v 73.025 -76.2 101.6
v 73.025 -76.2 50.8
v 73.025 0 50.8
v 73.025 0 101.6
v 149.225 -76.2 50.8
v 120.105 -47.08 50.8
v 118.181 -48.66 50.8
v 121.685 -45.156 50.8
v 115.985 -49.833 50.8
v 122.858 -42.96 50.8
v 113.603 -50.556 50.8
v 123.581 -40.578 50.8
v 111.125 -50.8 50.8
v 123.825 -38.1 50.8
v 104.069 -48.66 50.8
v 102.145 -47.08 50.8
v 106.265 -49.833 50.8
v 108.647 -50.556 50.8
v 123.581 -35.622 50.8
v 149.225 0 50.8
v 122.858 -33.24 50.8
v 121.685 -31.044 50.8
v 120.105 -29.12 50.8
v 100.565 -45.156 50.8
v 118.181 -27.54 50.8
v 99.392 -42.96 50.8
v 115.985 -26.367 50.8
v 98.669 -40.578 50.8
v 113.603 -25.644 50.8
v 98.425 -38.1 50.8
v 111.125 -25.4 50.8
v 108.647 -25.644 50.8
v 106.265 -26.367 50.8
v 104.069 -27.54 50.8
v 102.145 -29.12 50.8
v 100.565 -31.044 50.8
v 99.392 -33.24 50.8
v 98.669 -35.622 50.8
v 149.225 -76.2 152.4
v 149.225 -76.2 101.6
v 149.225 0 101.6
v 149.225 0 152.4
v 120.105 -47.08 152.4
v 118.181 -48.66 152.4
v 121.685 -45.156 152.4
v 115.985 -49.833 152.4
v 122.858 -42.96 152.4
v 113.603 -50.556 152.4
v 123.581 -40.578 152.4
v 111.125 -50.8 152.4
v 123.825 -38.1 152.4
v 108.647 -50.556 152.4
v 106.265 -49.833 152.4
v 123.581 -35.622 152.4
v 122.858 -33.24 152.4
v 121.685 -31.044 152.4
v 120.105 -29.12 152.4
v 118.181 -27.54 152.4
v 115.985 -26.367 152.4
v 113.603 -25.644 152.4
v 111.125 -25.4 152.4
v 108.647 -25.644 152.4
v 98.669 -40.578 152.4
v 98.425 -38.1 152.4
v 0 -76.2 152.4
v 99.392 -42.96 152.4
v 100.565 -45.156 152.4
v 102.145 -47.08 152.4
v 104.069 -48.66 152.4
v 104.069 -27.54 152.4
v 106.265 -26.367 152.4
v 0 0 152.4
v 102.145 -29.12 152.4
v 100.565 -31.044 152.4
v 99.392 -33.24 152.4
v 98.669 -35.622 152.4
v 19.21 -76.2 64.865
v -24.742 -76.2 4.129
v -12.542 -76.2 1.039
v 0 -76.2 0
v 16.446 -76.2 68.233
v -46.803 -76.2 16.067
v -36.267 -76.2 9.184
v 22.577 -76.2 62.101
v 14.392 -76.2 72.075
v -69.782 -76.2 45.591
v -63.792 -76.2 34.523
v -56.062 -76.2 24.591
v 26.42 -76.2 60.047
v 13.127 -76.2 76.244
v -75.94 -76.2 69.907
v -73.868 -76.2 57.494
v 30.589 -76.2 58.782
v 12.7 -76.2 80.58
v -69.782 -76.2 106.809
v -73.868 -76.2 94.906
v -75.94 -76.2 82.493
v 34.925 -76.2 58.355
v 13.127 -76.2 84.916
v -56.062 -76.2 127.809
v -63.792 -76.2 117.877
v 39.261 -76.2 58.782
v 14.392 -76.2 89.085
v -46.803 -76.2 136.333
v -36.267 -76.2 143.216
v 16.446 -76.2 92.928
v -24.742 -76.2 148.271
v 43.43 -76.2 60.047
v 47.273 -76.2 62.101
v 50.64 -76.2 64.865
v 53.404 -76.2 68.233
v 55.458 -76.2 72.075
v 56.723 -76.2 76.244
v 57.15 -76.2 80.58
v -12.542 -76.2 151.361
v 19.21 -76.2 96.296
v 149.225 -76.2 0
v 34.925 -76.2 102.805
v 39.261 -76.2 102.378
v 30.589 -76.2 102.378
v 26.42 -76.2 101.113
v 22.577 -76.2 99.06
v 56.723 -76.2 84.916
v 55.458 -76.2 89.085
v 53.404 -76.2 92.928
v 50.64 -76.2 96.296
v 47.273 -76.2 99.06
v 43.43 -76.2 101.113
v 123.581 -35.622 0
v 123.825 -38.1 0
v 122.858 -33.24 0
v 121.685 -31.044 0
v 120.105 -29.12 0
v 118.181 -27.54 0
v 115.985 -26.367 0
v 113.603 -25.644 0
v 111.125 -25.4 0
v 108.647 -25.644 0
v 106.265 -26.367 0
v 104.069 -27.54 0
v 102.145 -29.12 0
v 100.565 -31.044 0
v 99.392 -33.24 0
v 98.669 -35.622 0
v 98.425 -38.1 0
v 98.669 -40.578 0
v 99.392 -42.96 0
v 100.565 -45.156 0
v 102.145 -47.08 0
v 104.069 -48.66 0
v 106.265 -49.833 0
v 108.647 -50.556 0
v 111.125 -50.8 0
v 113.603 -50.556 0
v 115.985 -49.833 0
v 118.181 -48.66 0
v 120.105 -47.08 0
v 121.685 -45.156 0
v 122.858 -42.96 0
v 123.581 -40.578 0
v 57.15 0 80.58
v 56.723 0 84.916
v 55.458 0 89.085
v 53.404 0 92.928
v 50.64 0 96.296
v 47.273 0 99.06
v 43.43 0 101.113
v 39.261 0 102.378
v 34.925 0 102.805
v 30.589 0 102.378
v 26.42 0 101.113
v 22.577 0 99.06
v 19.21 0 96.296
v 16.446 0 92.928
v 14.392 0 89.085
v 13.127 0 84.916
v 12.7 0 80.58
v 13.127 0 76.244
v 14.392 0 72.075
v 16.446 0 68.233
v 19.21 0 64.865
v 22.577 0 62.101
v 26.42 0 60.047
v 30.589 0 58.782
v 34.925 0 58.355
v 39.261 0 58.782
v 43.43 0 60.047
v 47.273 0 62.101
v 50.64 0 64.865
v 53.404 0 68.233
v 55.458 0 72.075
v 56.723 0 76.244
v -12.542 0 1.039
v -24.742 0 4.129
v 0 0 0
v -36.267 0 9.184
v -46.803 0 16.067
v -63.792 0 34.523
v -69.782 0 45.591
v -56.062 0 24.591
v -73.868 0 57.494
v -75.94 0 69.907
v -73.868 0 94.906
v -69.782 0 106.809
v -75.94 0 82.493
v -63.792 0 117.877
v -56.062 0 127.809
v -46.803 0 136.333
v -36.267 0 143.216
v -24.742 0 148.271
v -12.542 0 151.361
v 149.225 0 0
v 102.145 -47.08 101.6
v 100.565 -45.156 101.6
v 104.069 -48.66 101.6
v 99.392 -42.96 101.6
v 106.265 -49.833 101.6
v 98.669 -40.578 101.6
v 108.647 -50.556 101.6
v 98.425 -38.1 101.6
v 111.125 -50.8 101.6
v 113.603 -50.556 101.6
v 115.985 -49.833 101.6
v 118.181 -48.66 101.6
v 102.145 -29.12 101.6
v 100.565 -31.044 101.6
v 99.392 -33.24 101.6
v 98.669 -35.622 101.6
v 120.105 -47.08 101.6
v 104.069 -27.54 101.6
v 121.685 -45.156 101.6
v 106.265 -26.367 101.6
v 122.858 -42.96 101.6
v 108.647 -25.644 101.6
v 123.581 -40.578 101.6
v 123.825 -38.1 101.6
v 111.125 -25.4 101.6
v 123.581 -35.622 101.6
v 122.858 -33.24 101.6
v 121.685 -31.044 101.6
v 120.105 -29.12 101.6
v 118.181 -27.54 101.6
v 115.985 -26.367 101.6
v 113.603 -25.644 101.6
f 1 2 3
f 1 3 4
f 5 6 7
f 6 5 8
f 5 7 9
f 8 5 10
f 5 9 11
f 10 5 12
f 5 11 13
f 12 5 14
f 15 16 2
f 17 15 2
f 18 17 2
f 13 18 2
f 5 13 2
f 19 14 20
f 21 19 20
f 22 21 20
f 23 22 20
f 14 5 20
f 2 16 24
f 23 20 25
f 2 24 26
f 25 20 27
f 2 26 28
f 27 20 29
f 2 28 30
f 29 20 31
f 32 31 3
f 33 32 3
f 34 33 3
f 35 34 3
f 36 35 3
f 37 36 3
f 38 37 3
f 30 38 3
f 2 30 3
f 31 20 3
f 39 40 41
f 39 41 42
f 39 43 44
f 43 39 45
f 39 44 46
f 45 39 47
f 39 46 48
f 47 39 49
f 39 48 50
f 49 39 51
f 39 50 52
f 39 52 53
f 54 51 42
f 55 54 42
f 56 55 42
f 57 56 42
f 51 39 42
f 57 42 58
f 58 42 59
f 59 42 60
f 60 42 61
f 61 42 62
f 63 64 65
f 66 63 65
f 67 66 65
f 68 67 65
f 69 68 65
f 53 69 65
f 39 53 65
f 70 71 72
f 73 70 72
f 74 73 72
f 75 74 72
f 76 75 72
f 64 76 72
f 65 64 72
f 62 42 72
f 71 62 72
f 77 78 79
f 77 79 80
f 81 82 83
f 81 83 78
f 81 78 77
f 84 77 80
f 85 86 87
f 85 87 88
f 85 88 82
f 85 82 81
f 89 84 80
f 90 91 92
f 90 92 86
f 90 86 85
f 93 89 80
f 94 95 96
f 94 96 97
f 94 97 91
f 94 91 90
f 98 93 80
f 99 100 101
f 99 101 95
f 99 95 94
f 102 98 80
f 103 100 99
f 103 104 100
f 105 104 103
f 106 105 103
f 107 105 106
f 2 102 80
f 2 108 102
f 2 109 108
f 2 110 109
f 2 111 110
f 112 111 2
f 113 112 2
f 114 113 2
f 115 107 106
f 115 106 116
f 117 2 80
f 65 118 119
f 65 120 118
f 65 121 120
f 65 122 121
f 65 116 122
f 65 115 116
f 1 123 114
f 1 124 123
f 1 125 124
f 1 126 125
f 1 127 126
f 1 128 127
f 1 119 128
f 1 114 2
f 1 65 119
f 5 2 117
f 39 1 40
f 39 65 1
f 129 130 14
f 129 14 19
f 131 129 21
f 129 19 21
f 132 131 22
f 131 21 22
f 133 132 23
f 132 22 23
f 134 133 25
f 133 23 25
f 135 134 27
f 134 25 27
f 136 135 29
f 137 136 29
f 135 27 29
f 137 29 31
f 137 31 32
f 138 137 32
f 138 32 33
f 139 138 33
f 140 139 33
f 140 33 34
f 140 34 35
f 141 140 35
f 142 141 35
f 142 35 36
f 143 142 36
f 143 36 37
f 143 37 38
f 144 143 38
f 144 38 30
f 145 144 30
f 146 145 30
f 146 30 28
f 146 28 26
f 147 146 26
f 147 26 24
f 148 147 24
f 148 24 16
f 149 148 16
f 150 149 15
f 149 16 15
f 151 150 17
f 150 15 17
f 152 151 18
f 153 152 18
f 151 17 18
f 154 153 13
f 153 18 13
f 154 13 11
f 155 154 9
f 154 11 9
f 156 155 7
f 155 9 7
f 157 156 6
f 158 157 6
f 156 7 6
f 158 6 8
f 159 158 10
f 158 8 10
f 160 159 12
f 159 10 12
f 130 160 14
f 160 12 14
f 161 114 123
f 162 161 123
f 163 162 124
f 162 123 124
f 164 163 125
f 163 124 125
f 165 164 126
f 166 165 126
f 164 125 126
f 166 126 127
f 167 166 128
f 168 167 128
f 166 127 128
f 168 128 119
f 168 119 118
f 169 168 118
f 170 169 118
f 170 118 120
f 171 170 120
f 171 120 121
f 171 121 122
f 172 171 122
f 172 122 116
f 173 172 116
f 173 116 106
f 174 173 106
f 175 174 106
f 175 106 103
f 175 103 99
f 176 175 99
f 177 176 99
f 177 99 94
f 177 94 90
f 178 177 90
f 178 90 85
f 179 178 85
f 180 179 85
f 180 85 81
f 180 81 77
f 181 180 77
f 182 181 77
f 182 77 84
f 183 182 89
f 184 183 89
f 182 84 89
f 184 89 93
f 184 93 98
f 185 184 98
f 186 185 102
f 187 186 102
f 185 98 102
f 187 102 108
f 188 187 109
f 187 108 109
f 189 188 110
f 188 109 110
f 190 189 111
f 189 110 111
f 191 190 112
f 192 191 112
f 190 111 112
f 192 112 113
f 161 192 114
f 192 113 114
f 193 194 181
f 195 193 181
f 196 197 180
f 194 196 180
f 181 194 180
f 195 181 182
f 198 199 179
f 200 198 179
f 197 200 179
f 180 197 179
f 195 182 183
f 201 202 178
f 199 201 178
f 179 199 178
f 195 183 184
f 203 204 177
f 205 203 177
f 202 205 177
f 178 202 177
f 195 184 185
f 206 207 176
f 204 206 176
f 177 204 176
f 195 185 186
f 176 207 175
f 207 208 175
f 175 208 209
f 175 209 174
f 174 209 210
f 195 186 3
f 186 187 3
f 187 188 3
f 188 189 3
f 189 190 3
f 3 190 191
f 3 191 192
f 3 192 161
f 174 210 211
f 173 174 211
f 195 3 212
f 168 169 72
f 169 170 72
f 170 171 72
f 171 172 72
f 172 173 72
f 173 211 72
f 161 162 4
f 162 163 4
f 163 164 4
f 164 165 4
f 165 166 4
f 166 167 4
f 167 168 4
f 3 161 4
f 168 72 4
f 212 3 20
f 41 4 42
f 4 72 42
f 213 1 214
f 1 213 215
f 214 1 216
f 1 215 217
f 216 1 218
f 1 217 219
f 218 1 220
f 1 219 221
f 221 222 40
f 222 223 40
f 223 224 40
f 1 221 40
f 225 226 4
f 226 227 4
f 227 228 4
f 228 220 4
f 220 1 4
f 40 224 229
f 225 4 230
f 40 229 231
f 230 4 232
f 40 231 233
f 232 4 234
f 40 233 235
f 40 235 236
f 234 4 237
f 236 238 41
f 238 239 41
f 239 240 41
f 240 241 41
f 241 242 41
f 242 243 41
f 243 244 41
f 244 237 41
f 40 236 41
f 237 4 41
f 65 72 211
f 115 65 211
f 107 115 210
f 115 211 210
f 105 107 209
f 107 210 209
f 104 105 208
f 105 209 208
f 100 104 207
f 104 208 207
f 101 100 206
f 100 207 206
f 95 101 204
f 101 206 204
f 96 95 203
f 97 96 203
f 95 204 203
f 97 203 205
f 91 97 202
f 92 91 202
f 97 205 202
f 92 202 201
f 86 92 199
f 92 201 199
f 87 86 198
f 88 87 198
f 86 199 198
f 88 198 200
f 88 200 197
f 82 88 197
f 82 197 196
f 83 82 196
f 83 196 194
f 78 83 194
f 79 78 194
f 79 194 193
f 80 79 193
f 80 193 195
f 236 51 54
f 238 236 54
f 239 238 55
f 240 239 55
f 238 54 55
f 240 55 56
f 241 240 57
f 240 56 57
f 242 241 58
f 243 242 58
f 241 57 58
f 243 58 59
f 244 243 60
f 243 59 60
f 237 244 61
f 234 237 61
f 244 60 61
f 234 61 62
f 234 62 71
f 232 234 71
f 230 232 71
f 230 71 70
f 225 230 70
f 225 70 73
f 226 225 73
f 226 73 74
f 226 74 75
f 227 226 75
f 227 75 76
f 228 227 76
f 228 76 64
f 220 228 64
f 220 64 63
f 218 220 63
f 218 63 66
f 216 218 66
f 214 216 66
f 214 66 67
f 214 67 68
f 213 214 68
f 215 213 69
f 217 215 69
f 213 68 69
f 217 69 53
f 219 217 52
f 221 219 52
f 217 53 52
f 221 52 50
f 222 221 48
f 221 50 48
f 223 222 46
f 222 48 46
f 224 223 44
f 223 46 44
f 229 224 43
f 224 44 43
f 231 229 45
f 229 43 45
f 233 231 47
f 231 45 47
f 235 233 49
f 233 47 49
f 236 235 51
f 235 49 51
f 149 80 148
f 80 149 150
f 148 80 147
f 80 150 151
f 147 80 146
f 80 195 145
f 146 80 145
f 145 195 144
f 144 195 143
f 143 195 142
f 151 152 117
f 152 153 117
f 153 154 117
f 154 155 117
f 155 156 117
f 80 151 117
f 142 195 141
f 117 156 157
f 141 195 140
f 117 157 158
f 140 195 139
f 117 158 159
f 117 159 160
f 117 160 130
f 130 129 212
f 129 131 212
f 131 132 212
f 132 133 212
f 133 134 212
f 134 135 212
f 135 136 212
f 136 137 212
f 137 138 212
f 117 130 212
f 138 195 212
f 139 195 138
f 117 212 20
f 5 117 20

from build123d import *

# Parameters (mm, degrees)
F1_DEPTH = 76.2
F2_R     = 22.225
F3_DEPTH = 254
F4_R     = 12.7
F5_DEPTH = 508


with BuildPart() as f1:
    # F0 (on Front) → F1 (new body)
    with BuildSketch(Plane.XZ):
        with BuildLine():
            ThreePointArc((0, 152.4), (-76.2, 76.2), (0, 0))
            Line((0, 0), (149.225, 0))
            Line((149.225, 0), (149.225, 50.8))
            Line((149.225, 50.8), (73.025, 50.8))
            Line((73.025, 50.8), (73.025, 101.6))
            Line((73.025, 101.6), (149.225, 101.6))
            Line((149.225, 101.6), (149.225, 152.4))
            Line((149.225, 152.4), (0, 152.4))
        make_face()
    extrude(amount=F1_DEPTH)

    # F2 (on face) → F3 (cut)
    with BuildSketch(Plane.XZ.offset(76.2)):
        with Locations((34.925, 80.580235)):
            Circle(F2_R)
    extrude(amount=-F3_DEPTH, mode=Mode.SUBTRACT)

    # F4 (on face) → F5 (cut)
    with BuildSketch(Plane.XY.offset(152.4)):
        with Locations((111.125, -38.1)):
            Circle(F4_R)
    extrude(amount=-F5_DEPTH, mode=Mode.SUBTRACT)


solid = f1.part
